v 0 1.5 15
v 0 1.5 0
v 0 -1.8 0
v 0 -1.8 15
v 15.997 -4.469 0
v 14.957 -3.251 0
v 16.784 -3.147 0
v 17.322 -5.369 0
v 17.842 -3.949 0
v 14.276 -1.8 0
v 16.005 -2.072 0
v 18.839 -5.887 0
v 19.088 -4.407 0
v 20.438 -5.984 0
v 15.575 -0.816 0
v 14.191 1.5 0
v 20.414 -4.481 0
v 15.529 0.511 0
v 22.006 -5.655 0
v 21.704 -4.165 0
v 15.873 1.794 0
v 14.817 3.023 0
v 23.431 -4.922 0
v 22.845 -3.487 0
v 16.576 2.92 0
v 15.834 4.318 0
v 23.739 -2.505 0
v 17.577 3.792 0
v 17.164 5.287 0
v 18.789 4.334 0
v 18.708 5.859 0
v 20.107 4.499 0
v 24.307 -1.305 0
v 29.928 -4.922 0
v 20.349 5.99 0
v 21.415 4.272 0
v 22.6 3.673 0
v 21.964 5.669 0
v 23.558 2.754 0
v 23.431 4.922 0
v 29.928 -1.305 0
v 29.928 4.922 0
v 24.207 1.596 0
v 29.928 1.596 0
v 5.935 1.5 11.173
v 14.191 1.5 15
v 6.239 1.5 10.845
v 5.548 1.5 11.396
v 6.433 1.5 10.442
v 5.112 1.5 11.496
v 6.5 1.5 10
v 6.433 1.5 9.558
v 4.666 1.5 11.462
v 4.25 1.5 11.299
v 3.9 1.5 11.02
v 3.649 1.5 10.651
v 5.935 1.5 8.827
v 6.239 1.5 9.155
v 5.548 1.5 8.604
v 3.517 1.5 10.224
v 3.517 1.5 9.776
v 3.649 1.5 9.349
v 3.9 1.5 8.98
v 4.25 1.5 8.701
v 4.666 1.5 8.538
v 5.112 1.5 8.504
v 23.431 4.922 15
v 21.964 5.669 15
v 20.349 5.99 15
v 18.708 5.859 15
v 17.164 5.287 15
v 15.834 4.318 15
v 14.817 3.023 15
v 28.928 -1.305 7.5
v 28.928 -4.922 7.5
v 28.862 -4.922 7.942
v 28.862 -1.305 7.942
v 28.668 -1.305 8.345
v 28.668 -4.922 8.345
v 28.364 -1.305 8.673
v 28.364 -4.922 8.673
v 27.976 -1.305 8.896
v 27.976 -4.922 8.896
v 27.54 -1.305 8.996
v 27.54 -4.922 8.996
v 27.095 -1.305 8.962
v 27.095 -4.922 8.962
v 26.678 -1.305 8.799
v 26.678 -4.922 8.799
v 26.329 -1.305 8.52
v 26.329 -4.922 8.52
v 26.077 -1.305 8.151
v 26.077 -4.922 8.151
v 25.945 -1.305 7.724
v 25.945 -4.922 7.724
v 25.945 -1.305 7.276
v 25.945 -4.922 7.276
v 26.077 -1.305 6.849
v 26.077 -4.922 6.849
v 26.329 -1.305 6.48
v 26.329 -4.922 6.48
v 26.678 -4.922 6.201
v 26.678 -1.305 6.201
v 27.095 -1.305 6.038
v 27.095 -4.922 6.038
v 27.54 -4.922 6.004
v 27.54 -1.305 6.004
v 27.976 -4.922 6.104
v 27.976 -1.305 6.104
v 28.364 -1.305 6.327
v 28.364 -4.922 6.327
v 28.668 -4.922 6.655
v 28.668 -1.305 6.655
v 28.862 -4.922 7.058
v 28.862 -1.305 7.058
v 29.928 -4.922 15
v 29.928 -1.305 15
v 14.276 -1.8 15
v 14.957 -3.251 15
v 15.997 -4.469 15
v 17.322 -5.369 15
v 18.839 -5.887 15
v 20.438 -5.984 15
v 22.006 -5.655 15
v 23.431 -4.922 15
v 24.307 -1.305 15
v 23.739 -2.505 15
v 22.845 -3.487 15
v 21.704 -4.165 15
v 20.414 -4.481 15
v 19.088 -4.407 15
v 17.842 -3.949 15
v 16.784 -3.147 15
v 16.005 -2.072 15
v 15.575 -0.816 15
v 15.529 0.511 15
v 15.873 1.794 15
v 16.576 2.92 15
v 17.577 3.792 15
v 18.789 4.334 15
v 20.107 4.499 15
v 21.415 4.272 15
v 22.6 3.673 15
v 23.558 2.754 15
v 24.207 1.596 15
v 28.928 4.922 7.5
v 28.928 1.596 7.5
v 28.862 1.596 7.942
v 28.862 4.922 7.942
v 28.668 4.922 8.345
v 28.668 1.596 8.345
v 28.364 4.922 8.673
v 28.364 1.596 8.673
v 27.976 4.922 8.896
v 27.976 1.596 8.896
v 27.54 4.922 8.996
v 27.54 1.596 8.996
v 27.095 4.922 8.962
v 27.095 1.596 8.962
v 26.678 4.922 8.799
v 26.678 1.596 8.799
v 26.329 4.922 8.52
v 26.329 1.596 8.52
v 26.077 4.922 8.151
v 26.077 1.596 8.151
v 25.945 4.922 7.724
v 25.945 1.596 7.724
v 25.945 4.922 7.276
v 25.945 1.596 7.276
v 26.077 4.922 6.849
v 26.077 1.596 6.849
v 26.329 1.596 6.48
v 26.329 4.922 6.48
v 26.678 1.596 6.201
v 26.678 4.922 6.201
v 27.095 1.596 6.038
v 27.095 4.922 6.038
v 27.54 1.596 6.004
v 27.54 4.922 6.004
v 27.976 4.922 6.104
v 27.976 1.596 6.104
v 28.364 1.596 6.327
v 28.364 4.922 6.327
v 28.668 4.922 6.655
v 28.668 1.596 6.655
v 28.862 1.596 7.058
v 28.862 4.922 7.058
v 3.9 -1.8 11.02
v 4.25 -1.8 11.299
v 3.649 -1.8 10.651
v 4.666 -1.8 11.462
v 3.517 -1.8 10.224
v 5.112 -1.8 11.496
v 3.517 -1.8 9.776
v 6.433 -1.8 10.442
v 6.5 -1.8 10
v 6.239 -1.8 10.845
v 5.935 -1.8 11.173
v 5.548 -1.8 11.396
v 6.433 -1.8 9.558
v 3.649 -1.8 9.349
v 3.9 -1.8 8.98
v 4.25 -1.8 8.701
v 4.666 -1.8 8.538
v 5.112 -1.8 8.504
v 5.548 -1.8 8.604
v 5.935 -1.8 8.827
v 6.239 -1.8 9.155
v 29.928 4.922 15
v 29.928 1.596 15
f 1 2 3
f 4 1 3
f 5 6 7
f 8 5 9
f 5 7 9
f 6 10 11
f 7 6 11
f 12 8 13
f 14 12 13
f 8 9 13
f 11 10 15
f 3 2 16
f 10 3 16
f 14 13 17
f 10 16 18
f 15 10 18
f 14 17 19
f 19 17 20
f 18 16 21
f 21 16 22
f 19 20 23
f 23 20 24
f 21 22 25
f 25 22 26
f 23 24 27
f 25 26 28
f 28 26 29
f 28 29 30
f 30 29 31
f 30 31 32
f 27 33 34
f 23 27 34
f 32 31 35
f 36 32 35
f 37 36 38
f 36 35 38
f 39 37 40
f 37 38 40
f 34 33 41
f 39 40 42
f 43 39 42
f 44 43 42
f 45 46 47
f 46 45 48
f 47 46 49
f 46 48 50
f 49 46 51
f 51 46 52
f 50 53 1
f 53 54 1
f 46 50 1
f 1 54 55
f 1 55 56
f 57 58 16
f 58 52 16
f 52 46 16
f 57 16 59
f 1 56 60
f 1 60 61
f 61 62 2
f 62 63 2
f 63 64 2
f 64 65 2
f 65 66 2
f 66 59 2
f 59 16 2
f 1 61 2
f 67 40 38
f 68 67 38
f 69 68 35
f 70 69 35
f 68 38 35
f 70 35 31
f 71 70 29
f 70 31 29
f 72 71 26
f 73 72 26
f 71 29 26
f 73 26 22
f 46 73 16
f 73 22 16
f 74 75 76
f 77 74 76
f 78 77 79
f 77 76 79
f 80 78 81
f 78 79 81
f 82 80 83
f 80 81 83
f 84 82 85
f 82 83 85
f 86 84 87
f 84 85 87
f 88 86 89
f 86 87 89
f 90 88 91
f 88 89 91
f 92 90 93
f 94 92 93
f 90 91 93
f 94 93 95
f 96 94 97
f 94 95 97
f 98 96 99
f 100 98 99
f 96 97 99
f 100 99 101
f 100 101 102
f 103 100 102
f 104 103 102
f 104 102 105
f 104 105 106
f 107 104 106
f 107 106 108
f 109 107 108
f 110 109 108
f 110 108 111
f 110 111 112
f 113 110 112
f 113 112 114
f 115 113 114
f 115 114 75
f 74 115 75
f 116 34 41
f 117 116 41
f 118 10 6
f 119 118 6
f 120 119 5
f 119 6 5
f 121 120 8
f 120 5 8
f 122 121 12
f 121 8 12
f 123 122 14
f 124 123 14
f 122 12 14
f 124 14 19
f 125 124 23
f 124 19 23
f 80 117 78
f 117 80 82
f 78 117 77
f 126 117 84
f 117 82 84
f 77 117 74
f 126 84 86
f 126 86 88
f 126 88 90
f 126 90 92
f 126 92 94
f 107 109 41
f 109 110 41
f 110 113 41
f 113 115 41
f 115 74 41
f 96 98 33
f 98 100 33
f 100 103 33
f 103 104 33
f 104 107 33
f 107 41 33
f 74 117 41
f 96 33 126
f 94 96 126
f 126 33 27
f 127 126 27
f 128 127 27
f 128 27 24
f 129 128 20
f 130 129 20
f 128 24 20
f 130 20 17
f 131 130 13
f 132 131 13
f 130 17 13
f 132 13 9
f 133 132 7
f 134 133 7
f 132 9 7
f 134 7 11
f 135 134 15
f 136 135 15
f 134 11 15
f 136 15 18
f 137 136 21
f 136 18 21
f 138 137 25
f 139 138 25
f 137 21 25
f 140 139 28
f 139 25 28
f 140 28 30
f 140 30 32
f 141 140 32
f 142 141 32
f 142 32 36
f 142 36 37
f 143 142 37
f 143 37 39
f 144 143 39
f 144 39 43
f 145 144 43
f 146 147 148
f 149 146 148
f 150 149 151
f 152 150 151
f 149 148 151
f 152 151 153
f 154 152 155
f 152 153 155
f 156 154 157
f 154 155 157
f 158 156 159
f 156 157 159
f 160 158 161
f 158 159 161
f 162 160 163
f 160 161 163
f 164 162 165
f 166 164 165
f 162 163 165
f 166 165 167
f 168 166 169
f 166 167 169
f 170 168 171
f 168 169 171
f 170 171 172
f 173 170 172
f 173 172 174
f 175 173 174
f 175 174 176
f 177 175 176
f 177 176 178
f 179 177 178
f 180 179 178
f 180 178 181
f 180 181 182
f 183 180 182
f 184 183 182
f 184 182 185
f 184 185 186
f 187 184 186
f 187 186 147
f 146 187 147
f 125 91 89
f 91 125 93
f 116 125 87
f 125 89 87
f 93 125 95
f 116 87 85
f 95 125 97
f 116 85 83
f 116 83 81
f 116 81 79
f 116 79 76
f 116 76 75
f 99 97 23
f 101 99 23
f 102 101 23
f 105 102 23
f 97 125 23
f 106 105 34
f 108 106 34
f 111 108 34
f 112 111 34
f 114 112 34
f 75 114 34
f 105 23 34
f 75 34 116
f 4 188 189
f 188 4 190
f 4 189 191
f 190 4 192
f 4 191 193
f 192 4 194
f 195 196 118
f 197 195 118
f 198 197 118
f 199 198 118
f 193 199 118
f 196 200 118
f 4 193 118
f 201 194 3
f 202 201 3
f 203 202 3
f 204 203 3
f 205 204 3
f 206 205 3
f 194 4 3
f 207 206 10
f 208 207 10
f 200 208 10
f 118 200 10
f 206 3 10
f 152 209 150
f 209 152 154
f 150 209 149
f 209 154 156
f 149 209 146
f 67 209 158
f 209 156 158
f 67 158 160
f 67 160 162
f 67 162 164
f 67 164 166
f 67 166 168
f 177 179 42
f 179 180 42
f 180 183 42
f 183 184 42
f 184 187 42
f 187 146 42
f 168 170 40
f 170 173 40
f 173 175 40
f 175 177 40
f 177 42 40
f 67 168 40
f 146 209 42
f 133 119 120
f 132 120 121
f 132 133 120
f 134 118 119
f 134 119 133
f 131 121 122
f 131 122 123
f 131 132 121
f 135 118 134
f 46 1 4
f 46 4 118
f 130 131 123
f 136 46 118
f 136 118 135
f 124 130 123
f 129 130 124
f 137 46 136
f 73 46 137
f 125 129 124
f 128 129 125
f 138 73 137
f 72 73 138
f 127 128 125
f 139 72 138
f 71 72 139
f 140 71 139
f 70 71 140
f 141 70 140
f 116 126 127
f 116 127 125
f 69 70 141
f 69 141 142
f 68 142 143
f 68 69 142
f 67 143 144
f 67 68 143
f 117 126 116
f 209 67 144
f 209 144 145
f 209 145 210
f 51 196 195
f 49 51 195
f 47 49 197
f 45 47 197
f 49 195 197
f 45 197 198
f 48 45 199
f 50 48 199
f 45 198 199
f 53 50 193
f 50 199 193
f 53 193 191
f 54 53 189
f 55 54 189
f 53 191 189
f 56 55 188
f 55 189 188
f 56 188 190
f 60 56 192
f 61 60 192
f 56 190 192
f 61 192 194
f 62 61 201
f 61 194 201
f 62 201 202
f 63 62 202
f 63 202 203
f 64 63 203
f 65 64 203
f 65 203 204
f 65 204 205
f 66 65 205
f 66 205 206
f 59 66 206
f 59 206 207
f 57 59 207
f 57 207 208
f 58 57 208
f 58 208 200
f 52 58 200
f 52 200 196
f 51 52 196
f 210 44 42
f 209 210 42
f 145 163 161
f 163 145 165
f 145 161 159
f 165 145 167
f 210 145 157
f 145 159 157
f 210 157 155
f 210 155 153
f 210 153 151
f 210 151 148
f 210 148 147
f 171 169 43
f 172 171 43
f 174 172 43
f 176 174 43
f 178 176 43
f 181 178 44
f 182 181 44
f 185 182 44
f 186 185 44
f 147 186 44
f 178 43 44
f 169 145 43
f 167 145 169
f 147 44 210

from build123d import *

# Parameters (mm, degrees)
F1_DEPTH = 15
F2_R     = 1.5
F3_DEPTH = 25
F4_R     = 1.5
F5_DEPTH = 25


with BuildPart() as f1:
    # F0 (on Top) → F1 (new body)
    with BuildSketch(Plane.XY):
        with BuildLine():
            ThreePointArc((24.306717, -1.304678), (15.502635, -0.15397), (24.207405, 1.596164))
            Line((24.207405, 1.596164), (29.928384, 1.596164))
            Line((29.928384, 1.596164), (29.928384, 4.922138))
            Line((29.928384, 4.922138), (23.431116, 4.922138))
            ThreePointArc((23.431116, 4.922138), (17.916276, 5.626553), (14.190525, 1.5))
            Line((14.190525, 1.5), (11.973724, 1.5))
            Line((11.973724, 1.5), (0, 1.5))
            Line((0, 1.5), (0, 0))
            Line((0, 0), (0, -1.5))
            Line((0, -1.5), (0, -1.8))
            Line((0, -1.8), (11.019785, -1.8))
            Line((11.019785, -1.8), (14.276365, -1.8))
            ThreePointArc((14.276365, -1.8), (18.063289, -5.678834), (23.431116, -4.922138))
            Line((23.431116, -4.922138), (29.928384, -4.922138))
            Line((29.928384, -4.922138), (29.928384, -1.304678))
            Line((29.928384, -1.304678), (24.306717, -1.304678))
        make_face()
    extrude(amount=F1_DEPTH)

    # F2 (on face) → F3 (cut)
    with BuildSketch(Plane.XZ.offset(1.8)):
        with Locations((5, 10)):
            Circle(F2_R)
    extrude(amount=-F3_DEPTH, mode=Mode.SUBTRACT)

    # F4 (on face) → F5 (cut)
    with BuildSketch(Plane.XZ.offset(4.922138)):
        with Locations((27.428384, 7.5)):
            Circle(F4_R)
    extrude(amount=-F5_DEPTH, mode=Mode.SUBTRACT)


solid = f1.part
